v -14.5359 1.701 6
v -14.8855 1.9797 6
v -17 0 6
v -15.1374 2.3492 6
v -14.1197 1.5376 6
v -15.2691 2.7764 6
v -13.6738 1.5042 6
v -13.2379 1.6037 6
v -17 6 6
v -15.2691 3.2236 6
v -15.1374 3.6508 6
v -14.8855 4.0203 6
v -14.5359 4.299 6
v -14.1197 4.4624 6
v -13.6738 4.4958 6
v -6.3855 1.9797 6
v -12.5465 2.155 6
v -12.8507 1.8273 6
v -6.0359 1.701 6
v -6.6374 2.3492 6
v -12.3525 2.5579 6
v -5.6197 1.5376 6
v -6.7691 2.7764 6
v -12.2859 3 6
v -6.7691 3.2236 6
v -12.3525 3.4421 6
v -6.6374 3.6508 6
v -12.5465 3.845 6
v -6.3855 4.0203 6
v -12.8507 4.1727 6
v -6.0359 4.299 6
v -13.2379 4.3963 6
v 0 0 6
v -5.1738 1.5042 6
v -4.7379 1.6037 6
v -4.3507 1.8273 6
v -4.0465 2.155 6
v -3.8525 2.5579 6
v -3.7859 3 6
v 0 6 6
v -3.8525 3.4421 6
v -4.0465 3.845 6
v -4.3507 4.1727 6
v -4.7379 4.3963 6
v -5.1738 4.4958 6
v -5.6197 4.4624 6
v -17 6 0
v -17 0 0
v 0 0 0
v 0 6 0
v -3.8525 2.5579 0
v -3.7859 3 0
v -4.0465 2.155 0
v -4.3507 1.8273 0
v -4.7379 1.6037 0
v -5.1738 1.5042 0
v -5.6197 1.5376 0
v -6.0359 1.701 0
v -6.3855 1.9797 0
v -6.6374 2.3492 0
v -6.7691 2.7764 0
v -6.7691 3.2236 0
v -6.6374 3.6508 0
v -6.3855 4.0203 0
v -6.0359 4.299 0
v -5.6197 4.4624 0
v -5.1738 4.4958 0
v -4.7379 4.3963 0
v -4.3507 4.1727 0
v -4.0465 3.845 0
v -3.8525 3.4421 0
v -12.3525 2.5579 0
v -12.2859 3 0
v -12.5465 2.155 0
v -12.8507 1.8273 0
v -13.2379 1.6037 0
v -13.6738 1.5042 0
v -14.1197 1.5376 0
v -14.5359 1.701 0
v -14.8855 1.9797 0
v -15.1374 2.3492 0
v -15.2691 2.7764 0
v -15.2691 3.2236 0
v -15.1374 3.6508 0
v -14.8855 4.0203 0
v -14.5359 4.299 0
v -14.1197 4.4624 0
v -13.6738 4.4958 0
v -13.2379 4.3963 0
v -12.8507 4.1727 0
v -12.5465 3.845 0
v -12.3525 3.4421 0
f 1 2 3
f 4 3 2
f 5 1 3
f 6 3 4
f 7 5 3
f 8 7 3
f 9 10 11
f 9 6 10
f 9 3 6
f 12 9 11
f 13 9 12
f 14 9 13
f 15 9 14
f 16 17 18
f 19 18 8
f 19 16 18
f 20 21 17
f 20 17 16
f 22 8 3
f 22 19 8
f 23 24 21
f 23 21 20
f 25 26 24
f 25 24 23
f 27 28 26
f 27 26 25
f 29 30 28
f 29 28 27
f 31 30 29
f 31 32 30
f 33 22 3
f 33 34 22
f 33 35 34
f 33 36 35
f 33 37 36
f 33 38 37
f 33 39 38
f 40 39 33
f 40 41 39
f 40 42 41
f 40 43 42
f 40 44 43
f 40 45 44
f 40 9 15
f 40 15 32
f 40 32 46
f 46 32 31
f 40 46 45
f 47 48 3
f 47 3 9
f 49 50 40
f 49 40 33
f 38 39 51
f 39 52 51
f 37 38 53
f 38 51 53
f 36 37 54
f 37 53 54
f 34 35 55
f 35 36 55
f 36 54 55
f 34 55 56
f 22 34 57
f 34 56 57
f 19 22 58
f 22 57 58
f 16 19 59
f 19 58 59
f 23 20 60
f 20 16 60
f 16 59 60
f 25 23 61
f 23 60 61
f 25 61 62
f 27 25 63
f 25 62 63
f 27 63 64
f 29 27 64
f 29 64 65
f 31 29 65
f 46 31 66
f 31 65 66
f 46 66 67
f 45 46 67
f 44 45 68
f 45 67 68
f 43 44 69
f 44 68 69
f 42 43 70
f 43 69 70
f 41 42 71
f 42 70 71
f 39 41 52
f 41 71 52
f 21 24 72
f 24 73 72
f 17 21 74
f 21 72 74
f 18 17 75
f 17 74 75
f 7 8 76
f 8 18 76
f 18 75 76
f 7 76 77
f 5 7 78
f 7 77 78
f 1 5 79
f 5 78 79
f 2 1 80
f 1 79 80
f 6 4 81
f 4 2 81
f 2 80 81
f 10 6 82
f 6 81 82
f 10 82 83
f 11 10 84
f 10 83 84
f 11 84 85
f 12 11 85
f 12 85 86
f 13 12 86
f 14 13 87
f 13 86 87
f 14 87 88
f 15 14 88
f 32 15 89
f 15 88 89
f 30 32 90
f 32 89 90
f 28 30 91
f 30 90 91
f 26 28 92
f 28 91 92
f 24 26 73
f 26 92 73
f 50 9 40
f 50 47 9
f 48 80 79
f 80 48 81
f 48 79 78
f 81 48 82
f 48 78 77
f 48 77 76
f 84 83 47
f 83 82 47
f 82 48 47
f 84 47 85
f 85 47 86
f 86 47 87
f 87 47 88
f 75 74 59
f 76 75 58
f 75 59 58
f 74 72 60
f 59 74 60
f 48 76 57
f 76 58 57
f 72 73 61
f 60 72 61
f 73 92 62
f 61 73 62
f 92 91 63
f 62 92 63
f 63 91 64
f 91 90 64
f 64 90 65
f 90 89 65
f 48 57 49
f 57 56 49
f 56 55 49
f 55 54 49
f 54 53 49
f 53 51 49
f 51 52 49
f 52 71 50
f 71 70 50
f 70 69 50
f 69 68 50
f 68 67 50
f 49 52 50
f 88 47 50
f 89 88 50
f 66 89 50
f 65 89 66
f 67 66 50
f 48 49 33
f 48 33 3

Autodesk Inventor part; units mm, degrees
ref_plane "YZ Plane" through (0, 0, 0) normal (1, 0, 0) x (0, 1, 0)
ref_plane "XZ Plane" through (0, 0, 0) normal (0, 1, 0) x (-1, 0, 0)
ref_plane "XY Plane" through (0, 0, 0) normal (0, 0, 1) x (1, 0, 0)
sketch "Sketch1" plane through (0, 0, 0) normal (0, 0, 1) x (1, 0, 0)
  circle A0 centre (-13.7859, 3) radius 1.5
  circle A1 centre (-5.2859, 3) radius 1.5
  line L0 (0, 0) -> (-17, 0)
  line L1 (0, 6) -> (0, 0)
  line L2 (-17, 6) -> (0, 6)
  line L3 (-17, 0) -> (-17, 6)
extrude "Extrusion1" add sketch "Sketch1" along normal blind 6
properties part number "XcrRightXEndstopTrigger"
